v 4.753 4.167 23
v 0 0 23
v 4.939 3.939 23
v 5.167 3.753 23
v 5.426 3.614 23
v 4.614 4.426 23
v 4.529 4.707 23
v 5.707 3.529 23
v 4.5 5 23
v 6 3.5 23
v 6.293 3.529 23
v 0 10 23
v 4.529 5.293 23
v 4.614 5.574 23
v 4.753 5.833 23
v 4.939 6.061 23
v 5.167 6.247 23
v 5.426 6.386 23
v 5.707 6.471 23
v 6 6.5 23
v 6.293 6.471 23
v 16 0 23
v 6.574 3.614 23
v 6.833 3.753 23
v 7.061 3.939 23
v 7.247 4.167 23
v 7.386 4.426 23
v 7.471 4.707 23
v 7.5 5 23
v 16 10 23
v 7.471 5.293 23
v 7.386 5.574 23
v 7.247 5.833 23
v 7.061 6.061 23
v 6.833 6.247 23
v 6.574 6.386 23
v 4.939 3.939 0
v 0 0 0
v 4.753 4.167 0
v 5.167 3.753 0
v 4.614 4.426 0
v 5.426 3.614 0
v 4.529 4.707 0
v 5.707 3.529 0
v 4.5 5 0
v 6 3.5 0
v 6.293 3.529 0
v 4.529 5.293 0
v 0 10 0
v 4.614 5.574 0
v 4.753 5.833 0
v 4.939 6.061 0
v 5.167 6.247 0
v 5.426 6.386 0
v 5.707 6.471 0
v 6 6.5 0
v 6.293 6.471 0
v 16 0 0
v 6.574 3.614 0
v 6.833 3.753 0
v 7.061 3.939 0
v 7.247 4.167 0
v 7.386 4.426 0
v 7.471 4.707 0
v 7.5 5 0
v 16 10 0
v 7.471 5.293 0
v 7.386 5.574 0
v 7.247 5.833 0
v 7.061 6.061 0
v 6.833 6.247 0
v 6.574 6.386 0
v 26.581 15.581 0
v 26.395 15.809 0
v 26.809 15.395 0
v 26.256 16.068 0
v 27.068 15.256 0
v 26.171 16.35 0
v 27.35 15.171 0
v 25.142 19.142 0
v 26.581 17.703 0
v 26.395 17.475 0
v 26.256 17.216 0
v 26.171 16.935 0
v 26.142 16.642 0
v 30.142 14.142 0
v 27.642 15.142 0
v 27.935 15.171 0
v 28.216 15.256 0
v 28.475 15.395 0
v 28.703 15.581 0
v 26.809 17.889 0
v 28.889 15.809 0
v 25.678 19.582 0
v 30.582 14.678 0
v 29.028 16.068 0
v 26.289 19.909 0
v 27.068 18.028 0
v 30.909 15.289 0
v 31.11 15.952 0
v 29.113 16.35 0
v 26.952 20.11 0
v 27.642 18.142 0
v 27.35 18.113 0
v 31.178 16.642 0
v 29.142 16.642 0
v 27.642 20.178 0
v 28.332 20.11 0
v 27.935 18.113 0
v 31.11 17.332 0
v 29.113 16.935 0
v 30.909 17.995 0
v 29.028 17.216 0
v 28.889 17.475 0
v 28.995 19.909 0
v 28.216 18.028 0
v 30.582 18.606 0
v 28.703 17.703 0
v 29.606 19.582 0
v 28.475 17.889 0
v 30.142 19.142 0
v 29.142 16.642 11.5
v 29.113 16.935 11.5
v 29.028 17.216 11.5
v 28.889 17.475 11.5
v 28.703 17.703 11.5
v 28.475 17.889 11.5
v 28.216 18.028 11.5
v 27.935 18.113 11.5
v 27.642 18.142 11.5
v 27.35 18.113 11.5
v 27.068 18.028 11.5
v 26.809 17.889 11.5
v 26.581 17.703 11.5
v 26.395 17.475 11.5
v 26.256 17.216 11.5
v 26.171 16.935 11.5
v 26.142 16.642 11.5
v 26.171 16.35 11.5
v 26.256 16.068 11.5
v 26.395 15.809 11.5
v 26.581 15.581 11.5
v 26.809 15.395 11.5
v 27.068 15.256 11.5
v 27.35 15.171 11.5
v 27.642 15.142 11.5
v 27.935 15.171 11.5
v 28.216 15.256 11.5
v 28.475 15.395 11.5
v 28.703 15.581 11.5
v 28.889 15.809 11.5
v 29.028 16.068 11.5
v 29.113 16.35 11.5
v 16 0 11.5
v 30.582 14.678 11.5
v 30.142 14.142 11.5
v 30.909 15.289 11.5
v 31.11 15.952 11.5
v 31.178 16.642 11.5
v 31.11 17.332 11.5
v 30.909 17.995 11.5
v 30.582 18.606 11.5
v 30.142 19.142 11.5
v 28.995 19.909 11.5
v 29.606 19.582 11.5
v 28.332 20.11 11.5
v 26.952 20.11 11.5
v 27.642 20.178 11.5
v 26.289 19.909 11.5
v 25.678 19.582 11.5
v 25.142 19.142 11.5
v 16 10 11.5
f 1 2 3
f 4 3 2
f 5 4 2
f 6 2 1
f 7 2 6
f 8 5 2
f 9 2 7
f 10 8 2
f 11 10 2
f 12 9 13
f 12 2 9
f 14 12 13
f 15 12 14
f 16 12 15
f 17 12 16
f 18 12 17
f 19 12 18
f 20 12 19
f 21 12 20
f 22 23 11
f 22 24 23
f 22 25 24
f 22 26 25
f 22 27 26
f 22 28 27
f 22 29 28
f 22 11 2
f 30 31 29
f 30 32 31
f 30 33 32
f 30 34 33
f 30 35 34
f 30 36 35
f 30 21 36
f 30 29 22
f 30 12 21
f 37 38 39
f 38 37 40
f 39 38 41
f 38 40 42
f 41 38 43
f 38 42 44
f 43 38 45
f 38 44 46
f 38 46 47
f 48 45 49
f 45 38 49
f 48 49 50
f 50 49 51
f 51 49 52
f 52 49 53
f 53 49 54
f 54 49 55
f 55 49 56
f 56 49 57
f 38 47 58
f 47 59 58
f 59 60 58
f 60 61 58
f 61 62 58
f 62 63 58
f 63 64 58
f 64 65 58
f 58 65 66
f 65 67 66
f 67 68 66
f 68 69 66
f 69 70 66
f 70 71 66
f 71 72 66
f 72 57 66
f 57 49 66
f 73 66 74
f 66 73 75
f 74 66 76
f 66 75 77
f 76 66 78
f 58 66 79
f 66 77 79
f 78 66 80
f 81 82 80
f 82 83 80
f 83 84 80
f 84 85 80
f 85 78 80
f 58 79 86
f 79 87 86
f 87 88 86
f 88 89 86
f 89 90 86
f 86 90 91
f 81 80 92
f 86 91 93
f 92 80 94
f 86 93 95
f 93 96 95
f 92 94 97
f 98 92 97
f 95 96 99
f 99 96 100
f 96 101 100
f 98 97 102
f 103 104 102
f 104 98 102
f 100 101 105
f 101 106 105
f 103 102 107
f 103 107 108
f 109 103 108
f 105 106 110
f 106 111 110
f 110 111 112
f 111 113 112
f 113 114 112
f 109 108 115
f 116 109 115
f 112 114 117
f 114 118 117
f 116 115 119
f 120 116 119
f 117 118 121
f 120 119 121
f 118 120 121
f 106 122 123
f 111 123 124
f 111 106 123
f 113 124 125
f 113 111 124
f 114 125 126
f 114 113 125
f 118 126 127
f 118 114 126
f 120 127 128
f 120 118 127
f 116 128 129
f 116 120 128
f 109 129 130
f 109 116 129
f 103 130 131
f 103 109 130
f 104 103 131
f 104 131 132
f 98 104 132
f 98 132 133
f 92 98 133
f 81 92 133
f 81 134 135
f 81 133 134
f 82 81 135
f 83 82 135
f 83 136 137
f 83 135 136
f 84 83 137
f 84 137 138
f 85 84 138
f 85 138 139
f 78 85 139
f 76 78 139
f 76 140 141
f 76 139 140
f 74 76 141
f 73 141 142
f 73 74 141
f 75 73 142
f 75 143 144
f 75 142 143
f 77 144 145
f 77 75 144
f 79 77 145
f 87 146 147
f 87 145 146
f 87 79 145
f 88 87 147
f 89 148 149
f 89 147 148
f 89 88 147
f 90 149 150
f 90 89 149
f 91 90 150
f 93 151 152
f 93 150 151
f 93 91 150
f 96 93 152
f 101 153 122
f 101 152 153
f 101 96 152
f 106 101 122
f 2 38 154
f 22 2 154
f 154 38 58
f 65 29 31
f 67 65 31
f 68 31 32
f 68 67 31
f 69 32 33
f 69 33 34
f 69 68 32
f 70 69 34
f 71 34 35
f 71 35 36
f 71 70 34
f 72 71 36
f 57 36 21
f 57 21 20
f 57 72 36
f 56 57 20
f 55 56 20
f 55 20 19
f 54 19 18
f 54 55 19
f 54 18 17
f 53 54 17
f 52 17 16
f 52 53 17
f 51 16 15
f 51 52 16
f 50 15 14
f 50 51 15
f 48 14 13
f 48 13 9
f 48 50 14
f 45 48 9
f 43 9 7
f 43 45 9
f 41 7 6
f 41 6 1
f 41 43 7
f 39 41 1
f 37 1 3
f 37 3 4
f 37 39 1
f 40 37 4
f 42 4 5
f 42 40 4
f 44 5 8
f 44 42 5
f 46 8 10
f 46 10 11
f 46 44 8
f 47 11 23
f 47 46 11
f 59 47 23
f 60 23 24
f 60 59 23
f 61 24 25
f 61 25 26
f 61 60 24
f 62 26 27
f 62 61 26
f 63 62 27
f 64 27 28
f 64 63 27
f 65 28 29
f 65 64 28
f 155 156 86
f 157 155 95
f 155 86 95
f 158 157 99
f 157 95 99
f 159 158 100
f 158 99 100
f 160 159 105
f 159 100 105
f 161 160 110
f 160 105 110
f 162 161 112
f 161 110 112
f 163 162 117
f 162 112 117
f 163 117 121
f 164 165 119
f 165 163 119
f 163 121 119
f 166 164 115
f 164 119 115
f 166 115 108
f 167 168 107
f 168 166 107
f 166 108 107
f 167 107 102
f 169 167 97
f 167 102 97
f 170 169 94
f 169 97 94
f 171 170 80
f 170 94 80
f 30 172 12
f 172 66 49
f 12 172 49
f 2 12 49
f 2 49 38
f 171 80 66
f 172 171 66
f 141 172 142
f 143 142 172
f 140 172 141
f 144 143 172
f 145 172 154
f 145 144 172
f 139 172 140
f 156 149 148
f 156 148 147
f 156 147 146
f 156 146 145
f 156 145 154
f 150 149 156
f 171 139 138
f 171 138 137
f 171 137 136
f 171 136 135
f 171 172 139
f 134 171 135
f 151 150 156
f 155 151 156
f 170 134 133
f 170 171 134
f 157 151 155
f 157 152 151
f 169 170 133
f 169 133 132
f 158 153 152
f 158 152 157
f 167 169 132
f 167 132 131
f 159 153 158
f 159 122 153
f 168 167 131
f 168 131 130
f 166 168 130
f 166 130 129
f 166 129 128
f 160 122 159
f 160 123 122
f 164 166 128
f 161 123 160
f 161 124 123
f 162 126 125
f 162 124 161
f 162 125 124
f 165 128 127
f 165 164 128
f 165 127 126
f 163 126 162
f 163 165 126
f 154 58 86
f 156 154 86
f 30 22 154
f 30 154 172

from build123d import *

# Parameters (mm, degrees)
SKETCH_1_R          = 1.5
EXTRUDE_2_DEPTH     = 23
SKETCH_2_W          = 17.071500421
SKETCH_2_H          = 21.570260429
CUT_EXTRUDE_1_DEPTH = 11.5


with BuildPart() as part:
    # 草图1 → 凸台-拉伸2 (new body)
    with BuildSketch(Plane.XY):
        with BuildLine():
            Line((16, 0), (30.142135624, 14.142135624))
            ThreePointArc((30.142135624, 14.142135624), (30.142135624, 19.142135624), (25.142135624, 19.142135624))
            Line((25.142135624, 19.142135624), (16, 10))
            Line((16, 10), (0, 10))
            Line((0, 10), (0, 0))
            Line((0, 0), (16, 0))
        make_face()
        with Locations((27.642135624, 16.642135624)):
            Circle(SKETCH_1_R, mode=Mode.SUBTRACT)
        with Locations((6, 5)):
            Circle(SKETCH_1_R, mode=Mode.SUBTRACT)
    extrude(amount=EXTRUDE_2_DEPTH)

    # 草图2 → 切除-拉伸1 (cut)
    with BuildSketch(Plane.XY.offset(23)):
        with Locations((24.535750211, 10.785130215)):
            Rectangle(SKETCH_2_W, SKETCH_2_H)
    extrude(amount=-CUT_EXTRUDE_1_DEPTH, mode=Mode.SUBTRACT)


solid = part.part
